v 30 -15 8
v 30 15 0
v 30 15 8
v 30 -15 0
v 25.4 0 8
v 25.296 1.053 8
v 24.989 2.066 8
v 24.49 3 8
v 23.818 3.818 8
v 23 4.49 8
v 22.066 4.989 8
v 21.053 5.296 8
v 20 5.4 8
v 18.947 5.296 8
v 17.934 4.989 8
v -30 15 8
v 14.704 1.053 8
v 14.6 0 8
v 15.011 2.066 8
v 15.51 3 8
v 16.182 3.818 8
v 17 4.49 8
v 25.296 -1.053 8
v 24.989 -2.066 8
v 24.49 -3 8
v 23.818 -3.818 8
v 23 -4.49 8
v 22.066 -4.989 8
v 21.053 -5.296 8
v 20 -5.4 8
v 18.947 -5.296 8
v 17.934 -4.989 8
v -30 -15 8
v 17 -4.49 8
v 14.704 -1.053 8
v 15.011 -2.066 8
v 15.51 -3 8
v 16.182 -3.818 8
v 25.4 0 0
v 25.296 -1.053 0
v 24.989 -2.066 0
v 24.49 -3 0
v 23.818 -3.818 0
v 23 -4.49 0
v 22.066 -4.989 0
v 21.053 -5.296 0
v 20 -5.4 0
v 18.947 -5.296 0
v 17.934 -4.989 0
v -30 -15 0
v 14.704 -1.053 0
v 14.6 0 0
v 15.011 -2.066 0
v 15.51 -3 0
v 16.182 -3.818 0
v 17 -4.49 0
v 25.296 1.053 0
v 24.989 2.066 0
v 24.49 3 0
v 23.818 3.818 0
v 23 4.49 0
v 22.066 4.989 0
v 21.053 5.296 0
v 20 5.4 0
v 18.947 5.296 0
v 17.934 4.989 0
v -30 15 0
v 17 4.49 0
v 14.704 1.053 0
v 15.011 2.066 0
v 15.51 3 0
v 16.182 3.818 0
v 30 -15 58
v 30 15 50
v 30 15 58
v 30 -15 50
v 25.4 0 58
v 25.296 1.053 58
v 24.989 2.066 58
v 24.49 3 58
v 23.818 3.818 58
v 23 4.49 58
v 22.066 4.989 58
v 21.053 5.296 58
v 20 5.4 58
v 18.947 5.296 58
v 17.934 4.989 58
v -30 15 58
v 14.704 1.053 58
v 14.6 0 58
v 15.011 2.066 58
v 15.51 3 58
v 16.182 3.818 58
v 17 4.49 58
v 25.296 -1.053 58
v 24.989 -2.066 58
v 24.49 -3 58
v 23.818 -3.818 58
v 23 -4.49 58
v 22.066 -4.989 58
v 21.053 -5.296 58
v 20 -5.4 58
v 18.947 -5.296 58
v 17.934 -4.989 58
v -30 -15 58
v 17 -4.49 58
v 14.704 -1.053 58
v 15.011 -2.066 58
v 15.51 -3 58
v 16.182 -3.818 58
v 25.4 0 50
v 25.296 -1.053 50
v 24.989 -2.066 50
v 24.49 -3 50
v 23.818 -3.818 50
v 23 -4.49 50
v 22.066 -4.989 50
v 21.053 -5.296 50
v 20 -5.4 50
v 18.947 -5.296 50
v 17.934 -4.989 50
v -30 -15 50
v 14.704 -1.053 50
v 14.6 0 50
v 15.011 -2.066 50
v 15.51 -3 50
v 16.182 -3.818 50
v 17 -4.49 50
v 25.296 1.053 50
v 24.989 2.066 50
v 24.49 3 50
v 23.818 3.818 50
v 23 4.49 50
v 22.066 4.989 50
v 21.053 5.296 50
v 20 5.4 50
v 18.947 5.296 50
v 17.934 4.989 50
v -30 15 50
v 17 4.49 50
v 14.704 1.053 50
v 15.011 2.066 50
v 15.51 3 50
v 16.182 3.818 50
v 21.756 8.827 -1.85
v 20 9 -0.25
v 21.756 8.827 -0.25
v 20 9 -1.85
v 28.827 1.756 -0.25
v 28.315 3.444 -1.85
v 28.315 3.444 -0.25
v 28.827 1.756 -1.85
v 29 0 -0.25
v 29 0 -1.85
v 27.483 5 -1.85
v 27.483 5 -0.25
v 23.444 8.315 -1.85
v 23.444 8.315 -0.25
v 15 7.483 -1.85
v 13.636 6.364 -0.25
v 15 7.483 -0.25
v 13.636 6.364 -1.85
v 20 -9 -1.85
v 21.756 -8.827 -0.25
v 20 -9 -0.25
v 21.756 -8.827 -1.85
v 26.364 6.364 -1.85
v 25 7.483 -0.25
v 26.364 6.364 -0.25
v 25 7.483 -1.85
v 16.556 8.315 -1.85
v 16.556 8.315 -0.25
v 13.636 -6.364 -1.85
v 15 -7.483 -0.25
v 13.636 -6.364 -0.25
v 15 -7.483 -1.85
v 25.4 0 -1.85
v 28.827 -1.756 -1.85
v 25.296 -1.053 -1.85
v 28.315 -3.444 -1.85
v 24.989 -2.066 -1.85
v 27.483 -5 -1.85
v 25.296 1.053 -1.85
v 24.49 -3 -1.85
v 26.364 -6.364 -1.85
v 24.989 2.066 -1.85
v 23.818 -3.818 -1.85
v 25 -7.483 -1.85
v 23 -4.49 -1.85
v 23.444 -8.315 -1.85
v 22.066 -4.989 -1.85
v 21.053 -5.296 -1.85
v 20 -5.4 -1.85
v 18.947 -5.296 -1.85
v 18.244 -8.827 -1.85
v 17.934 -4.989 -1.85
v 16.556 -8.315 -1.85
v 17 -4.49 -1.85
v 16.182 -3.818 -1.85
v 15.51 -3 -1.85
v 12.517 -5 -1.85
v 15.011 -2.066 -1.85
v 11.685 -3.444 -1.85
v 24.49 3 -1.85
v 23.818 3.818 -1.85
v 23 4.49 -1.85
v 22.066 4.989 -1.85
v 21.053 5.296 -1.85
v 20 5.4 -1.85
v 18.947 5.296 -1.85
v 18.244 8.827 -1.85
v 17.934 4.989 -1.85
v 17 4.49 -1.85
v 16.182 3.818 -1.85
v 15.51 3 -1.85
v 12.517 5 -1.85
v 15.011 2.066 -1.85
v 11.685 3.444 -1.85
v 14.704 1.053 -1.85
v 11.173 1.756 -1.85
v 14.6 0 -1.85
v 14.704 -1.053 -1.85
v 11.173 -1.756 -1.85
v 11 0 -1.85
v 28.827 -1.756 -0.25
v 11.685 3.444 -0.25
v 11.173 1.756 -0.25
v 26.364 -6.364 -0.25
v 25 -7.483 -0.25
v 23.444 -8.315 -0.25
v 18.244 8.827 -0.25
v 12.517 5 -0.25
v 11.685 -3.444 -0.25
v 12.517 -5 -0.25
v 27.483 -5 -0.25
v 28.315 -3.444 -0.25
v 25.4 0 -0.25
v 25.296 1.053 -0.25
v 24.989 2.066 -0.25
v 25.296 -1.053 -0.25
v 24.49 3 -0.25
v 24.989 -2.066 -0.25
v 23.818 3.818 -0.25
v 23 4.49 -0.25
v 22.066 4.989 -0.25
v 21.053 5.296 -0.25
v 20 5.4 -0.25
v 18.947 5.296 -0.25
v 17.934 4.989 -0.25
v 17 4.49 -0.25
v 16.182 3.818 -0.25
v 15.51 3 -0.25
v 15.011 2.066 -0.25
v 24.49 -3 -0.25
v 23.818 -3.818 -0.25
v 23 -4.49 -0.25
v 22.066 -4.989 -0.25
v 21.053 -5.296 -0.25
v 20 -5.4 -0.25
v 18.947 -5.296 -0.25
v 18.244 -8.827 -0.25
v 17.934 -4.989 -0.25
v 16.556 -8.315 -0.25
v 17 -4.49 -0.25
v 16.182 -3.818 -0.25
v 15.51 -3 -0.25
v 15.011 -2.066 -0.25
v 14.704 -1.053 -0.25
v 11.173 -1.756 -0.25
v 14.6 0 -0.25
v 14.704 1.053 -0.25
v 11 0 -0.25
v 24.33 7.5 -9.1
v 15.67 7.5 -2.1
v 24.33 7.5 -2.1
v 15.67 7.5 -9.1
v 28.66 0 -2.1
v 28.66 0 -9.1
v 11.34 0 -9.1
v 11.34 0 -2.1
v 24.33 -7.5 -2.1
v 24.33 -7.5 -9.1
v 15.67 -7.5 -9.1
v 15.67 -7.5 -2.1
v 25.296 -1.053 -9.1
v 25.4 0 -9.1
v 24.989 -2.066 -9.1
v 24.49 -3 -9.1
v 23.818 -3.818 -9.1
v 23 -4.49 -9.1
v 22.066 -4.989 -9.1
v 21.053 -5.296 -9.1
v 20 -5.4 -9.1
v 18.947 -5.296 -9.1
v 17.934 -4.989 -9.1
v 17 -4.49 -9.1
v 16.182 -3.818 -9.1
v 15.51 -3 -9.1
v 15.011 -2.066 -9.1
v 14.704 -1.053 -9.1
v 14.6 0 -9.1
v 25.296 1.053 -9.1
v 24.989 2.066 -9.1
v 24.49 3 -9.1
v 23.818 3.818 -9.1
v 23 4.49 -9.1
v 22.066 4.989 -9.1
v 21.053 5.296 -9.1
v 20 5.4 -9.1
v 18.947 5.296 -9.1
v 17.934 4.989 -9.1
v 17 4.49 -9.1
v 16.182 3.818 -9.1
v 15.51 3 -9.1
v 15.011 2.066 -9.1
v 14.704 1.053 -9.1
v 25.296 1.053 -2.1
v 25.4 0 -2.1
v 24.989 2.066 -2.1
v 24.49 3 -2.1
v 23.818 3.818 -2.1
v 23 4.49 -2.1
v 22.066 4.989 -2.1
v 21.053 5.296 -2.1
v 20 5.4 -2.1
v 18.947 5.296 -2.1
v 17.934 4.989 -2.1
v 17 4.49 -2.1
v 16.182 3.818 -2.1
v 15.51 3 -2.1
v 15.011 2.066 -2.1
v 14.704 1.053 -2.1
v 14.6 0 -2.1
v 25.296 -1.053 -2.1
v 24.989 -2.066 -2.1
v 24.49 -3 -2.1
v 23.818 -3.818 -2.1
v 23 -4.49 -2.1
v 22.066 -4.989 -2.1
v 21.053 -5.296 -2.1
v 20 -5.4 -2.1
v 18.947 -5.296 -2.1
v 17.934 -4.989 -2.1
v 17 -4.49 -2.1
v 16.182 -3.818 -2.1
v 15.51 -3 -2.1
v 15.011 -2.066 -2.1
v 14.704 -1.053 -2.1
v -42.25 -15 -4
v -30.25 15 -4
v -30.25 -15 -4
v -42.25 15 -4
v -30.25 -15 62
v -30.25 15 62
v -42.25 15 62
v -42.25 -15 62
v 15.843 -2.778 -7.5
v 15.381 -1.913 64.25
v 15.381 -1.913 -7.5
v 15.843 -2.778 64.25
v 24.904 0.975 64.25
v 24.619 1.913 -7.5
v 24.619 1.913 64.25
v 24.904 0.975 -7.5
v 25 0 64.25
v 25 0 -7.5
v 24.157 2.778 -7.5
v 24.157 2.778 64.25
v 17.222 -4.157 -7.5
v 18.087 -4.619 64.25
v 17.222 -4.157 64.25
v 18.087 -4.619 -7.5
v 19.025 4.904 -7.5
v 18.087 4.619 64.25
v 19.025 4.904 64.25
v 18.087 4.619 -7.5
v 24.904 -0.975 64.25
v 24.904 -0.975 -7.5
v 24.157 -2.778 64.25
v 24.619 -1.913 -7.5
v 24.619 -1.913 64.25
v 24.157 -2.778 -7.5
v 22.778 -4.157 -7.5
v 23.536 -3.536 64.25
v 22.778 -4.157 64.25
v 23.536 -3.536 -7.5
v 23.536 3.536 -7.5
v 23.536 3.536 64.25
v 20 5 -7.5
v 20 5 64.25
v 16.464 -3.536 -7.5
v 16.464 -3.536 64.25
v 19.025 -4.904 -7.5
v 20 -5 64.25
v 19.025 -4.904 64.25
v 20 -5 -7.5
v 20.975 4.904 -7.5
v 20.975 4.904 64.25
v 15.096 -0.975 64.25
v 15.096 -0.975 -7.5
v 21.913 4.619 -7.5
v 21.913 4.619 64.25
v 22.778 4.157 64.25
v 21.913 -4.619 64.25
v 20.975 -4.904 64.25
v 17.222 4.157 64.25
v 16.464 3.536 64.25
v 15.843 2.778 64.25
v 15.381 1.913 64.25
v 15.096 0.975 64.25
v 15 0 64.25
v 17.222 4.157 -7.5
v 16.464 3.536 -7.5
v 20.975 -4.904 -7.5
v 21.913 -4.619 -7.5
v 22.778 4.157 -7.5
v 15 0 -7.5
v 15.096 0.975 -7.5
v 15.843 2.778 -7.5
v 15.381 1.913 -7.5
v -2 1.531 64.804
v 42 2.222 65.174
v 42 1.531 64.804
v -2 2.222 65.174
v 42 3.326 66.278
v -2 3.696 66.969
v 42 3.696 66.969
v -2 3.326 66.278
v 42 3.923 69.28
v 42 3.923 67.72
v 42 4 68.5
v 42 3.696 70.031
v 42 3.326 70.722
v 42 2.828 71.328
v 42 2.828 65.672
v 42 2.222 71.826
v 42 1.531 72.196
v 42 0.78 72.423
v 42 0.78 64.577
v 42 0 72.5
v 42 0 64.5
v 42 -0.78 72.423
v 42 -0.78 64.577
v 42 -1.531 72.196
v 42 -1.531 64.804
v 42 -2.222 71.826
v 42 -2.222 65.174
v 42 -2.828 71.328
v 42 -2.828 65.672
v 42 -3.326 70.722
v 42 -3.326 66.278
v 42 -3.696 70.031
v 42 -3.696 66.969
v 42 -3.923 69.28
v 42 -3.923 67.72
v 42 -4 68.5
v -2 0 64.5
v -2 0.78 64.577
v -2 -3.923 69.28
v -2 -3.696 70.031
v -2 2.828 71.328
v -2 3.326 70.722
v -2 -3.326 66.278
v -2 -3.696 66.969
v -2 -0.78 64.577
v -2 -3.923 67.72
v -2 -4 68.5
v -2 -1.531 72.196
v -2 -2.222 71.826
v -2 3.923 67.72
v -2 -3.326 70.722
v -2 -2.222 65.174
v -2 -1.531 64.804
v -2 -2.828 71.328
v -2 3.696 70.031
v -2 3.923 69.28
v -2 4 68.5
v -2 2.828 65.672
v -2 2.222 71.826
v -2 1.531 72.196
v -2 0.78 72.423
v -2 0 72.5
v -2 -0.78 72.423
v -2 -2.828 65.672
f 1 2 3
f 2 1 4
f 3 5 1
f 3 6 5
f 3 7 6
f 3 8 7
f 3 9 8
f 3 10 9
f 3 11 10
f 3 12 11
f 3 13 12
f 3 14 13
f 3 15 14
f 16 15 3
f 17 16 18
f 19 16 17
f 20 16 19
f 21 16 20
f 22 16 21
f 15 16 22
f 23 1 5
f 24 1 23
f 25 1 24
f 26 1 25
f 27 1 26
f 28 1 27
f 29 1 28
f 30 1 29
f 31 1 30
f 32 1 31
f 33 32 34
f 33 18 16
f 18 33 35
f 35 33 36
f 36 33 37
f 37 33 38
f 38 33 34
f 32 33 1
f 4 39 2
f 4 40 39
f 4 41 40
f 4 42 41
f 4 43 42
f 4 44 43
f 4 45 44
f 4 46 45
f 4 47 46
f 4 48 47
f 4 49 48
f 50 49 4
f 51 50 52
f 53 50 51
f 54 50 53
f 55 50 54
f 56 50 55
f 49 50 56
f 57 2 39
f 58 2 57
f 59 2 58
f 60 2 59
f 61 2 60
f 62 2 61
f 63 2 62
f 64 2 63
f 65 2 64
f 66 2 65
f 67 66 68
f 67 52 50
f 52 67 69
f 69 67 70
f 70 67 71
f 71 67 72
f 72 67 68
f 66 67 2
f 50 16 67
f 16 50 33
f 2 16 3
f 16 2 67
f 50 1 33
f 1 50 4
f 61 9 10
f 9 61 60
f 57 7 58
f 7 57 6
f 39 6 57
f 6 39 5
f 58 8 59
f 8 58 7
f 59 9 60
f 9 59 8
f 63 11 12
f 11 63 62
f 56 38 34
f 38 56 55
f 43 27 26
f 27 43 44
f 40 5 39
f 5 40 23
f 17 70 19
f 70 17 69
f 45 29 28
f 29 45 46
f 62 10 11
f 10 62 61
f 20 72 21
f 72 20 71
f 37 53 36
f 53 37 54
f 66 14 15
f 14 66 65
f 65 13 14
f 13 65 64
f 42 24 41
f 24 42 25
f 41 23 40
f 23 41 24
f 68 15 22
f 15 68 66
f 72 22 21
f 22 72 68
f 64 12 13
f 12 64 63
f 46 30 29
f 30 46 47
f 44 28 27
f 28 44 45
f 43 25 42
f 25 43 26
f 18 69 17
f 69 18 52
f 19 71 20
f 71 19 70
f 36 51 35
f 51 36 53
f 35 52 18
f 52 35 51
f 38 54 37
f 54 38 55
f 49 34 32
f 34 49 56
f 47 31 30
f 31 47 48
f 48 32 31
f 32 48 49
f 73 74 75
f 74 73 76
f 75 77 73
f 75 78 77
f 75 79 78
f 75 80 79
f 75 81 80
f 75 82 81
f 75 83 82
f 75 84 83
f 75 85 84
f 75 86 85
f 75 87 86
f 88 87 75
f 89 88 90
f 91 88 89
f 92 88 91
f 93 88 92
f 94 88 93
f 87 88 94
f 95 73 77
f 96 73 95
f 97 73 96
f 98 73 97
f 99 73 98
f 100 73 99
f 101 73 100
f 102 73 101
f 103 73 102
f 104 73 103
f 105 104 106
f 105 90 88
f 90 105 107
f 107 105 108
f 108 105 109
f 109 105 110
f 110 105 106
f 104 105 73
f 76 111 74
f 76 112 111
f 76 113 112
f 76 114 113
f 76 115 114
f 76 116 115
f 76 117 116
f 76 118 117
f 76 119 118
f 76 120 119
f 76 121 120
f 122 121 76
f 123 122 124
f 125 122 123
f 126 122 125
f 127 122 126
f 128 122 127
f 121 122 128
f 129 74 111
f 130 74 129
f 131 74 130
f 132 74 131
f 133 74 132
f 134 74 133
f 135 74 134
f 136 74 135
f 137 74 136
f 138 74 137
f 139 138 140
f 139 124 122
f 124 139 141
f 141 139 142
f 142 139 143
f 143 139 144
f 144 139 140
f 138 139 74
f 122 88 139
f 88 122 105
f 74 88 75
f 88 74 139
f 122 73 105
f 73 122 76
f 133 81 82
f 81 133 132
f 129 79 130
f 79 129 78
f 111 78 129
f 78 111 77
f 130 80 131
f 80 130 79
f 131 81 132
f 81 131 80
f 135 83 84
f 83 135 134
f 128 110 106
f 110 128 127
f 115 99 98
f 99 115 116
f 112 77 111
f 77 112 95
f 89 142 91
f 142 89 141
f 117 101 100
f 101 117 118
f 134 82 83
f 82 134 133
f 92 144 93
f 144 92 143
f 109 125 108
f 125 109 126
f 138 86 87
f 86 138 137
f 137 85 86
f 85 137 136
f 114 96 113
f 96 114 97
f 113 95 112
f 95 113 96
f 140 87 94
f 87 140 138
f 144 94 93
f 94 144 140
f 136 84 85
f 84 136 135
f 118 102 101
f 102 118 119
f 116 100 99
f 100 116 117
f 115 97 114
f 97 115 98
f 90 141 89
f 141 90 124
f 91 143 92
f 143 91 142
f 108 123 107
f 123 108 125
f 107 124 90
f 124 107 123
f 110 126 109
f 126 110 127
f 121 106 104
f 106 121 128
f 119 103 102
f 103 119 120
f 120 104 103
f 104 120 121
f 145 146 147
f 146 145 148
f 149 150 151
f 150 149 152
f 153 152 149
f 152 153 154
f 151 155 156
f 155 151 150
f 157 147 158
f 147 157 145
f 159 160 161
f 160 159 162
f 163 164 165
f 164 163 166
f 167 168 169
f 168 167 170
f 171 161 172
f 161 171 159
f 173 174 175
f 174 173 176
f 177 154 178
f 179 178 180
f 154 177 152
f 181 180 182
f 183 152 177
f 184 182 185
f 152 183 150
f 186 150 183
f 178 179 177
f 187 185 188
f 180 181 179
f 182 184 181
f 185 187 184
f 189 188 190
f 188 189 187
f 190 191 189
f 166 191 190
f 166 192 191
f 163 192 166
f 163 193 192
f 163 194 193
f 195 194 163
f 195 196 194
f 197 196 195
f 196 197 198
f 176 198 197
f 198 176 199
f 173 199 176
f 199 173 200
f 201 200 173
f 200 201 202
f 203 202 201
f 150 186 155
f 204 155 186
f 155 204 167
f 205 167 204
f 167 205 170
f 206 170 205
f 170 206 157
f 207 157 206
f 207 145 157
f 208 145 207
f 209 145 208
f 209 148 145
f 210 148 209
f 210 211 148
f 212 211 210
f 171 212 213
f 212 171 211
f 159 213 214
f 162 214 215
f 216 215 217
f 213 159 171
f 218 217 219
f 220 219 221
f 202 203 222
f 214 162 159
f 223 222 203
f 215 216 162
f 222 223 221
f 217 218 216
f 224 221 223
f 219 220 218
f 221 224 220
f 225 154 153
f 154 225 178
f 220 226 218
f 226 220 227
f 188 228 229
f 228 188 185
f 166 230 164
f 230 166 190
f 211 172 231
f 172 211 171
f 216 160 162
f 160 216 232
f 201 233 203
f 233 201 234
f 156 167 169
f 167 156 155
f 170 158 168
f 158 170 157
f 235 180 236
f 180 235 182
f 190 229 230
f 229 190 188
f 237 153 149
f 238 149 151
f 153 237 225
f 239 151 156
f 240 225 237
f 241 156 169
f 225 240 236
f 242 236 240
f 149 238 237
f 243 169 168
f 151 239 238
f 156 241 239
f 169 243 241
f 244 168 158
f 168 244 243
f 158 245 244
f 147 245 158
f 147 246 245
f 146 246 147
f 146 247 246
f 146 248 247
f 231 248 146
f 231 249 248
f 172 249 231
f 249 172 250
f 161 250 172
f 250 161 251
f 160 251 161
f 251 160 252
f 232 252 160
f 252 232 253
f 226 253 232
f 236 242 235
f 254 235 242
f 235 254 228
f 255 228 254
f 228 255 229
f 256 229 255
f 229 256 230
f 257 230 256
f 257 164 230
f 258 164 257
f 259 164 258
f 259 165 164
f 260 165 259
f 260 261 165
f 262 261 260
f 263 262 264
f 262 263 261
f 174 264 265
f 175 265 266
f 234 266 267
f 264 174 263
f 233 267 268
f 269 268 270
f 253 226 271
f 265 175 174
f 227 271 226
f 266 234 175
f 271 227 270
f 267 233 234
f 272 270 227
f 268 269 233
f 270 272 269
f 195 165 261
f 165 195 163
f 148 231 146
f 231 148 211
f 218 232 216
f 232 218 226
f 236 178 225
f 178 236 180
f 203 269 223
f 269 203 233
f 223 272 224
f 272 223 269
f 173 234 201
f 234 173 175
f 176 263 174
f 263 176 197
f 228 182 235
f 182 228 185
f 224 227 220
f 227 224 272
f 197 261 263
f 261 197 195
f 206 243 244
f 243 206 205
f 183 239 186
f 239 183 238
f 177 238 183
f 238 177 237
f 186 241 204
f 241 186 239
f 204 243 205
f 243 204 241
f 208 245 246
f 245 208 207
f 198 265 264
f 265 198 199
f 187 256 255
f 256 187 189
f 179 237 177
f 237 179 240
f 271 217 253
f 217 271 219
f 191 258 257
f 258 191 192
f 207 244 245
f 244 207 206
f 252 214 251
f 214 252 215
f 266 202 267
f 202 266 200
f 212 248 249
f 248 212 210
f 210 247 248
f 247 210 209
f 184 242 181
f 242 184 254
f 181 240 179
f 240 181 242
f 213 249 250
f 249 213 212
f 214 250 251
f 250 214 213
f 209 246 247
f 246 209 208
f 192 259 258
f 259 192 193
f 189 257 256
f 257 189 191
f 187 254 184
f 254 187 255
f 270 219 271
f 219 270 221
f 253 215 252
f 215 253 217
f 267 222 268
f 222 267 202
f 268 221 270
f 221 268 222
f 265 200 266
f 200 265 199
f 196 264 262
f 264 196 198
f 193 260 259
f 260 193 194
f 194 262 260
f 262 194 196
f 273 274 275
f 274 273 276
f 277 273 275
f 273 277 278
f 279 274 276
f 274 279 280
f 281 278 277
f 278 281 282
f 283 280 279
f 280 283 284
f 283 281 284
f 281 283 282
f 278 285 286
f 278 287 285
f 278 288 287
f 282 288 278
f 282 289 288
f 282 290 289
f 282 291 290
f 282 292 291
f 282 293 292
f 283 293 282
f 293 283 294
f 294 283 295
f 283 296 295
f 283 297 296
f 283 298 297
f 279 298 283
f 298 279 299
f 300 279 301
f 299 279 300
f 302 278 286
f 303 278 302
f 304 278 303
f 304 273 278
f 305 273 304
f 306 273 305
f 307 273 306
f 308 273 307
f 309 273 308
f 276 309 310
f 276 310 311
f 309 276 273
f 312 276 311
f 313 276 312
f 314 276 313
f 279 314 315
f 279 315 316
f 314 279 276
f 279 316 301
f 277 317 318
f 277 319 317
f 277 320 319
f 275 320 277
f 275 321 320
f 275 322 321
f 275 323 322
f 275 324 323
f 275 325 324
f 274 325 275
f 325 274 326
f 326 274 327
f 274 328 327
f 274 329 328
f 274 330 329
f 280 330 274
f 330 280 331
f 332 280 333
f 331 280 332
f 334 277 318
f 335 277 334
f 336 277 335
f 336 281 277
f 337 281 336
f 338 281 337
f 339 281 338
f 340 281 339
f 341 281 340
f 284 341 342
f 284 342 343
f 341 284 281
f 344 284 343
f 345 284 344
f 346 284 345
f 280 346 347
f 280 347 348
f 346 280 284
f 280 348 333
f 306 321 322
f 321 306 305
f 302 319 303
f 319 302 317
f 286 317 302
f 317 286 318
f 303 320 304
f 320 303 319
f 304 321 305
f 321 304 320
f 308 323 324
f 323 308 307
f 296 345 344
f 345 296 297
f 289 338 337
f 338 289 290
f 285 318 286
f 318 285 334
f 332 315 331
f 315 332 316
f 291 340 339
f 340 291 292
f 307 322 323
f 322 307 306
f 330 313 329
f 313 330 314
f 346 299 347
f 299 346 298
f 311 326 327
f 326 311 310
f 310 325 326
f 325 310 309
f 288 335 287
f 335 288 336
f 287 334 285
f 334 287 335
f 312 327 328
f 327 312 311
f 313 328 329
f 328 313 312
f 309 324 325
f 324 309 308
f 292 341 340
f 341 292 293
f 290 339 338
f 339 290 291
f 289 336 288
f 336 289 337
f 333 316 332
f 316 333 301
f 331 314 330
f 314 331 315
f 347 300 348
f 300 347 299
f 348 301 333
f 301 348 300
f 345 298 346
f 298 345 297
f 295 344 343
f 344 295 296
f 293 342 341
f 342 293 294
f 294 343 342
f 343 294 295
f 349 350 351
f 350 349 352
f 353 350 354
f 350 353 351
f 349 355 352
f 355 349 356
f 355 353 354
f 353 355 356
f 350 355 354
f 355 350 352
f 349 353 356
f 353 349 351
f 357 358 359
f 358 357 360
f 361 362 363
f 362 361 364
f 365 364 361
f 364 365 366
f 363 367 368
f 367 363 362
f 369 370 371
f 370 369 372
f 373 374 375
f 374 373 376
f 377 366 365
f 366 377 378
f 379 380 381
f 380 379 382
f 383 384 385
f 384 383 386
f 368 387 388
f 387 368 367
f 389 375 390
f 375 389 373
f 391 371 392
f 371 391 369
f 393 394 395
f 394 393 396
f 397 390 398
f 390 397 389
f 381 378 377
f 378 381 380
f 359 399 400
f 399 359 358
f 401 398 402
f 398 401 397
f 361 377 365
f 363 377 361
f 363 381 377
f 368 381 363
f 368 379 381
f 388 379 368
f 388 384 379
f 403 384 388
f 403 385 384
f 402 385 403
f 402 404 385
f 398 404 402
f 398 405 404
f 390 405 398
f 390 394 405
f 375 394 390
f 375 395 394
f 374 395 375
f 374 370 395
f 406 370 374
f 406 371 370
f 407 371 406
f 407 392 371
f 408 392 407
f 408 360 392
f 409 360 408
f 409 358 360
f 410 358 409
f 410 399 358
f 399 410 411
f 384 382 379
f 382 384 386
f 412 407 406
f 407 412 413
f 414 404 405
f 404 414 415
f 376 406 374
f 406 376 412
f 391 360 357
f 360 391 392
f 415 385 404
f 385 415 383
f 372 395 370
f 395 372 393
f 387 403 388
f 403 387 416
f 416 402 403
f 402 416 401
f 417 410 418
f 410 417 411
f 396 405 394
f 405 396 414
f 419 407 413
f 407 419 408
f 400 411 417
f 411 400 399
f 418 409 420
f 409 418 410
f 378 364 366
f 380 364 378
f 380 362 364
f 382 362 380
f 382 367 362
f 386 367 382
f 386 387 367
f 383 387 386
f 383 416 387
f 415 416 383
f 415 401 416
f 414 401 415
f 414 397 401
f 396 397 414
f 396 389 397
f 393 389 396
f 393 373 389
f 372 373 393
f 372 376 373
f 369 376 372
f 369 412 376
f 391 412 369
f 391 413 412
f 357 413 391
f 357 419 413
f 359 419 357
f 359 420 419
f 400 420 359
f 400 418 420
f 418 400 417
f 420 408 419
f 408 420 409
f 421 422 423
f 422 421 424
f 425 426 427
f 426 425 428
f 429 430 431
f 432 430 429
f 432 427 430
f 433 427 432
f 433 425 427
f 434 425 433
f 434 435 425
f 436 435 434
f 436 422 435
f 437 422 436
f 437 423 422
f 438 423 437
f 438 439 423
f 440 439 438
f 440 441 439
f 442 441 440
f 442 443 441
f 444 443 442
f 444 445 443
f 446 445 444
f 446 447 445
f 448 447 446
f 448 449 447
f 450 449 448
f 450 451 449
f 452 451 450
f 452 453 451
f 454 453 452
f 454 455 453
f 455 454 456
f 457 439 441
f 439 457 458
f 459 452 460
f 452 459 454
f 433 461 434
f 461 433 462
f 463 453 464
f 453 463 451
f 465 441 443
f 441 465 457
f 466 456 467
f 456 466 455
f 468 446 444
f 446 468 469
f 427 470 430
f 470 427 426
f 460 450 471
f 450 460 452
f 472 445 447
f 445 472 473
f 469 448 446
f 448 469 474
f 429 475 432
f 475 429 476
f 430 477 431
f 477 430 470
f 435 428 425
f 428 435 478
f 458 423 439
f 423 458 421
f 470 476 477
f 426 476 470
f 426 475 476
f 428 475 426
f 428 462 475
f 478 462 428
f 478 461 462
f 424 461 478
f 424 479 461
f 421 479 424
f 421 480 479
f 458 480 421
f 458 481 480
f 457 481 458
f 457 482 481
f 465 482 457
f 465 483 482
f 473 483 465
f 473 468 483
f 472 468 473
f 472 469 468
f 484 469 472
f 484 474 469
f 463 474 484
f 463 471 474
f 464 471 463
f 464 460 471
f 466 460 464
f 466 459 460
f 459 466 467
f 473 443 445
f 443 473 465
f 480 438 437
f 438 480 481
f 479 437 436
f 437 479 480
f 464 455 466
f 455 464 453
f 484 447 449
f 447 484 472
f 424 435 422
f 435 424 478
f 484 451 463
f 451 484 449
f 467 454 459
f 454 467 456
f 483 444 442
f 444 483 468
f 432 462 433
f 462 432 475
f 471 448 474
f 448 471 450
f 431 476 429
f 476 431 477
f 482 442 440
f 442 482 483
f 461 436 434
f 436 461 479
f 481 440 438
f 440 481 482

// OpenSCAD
$fn = 32;

// ------------------------------------------------------------------------
// C clamp: throat 50 mm, screw d10
// Every part is its own module, assembly() places every instance.
// ------------------------------------------------------------------------

// --- part 1 ---
module clamp_arm() {
  difference() {
    translate([-30, -15, 0]) cube([60, 30, 8]);
    translate([20, 0, -1]) cylinder(h = 10, d = 10.8);
  }
}

// --- part 2 ---
module clamp_spine() {
  difference() {
    translate([-33, -15, 0]) cube([66, 30, 12]);
  }
}

// --- part 3 ---
module clamp_screw() {
  translate([0, 0, -35.875]) cylinder(h = 71.75, d = 10);
}

// --- part 4 ---
module clamp_washer() {
  difference() {
      translate([0, 0, 0]) cylinder(h = 1.6, d = 18);
      translate([0, 0, -1]) cylinder(h = 3.6, d = 10.8);
    }
}

// --- part 5 ---
module clamp_nut() {
  difference() {
    linear_extrude(height = 7) polygon(points = [[8.66, 0], [4.33, 7.5], [-4.33, 7.5], [-8.66, 0], [-4.33, -7.5], [4.33, -7.5]]);
    translate([0, 0, -1]) cylinder(h = 9, d = 10.8);
  }
}

// --- part 6 ---
module tommy_bar() {
  translate([0, 0, -22]) cylinder(h = 44, d = 8);
}

// --- assembly ---
module assembly() {
  color([0.80, 0.24, 0.20]) translate([0, 0, 0]) rotate([0, 0, 0]) clamp_arm();
  color([0.20, 0.45, 0.75]) translate([0, 0, 50]) rotate([0, 0, 0]) clamp_arm();
  color([0.25, 0.62, 0.32]) translate([-42.25, 0, 29]) rotate([0, 90, 0]) clamp_spine();
  color([0.92, 0.70, 0.18]) translate([20, 0, 28.375]) rotate([0, 0, 0]) clamp_screw();
  color([0.58, 0.35, 0.70]) translate([20, 0, -1.85]) rotate([0, 0, 0]) clamp_washer();
  color([0.16, 0.66, 0.66]) translate([20, 0, -9.1]) rotate([0, 0, 0]) clamp_nut();
  color([0.85, 0.48, 0.18]) translate([20, 0, 68.5]) rotate([0, 90, 0]) tommy_bar();
}

assembly();
